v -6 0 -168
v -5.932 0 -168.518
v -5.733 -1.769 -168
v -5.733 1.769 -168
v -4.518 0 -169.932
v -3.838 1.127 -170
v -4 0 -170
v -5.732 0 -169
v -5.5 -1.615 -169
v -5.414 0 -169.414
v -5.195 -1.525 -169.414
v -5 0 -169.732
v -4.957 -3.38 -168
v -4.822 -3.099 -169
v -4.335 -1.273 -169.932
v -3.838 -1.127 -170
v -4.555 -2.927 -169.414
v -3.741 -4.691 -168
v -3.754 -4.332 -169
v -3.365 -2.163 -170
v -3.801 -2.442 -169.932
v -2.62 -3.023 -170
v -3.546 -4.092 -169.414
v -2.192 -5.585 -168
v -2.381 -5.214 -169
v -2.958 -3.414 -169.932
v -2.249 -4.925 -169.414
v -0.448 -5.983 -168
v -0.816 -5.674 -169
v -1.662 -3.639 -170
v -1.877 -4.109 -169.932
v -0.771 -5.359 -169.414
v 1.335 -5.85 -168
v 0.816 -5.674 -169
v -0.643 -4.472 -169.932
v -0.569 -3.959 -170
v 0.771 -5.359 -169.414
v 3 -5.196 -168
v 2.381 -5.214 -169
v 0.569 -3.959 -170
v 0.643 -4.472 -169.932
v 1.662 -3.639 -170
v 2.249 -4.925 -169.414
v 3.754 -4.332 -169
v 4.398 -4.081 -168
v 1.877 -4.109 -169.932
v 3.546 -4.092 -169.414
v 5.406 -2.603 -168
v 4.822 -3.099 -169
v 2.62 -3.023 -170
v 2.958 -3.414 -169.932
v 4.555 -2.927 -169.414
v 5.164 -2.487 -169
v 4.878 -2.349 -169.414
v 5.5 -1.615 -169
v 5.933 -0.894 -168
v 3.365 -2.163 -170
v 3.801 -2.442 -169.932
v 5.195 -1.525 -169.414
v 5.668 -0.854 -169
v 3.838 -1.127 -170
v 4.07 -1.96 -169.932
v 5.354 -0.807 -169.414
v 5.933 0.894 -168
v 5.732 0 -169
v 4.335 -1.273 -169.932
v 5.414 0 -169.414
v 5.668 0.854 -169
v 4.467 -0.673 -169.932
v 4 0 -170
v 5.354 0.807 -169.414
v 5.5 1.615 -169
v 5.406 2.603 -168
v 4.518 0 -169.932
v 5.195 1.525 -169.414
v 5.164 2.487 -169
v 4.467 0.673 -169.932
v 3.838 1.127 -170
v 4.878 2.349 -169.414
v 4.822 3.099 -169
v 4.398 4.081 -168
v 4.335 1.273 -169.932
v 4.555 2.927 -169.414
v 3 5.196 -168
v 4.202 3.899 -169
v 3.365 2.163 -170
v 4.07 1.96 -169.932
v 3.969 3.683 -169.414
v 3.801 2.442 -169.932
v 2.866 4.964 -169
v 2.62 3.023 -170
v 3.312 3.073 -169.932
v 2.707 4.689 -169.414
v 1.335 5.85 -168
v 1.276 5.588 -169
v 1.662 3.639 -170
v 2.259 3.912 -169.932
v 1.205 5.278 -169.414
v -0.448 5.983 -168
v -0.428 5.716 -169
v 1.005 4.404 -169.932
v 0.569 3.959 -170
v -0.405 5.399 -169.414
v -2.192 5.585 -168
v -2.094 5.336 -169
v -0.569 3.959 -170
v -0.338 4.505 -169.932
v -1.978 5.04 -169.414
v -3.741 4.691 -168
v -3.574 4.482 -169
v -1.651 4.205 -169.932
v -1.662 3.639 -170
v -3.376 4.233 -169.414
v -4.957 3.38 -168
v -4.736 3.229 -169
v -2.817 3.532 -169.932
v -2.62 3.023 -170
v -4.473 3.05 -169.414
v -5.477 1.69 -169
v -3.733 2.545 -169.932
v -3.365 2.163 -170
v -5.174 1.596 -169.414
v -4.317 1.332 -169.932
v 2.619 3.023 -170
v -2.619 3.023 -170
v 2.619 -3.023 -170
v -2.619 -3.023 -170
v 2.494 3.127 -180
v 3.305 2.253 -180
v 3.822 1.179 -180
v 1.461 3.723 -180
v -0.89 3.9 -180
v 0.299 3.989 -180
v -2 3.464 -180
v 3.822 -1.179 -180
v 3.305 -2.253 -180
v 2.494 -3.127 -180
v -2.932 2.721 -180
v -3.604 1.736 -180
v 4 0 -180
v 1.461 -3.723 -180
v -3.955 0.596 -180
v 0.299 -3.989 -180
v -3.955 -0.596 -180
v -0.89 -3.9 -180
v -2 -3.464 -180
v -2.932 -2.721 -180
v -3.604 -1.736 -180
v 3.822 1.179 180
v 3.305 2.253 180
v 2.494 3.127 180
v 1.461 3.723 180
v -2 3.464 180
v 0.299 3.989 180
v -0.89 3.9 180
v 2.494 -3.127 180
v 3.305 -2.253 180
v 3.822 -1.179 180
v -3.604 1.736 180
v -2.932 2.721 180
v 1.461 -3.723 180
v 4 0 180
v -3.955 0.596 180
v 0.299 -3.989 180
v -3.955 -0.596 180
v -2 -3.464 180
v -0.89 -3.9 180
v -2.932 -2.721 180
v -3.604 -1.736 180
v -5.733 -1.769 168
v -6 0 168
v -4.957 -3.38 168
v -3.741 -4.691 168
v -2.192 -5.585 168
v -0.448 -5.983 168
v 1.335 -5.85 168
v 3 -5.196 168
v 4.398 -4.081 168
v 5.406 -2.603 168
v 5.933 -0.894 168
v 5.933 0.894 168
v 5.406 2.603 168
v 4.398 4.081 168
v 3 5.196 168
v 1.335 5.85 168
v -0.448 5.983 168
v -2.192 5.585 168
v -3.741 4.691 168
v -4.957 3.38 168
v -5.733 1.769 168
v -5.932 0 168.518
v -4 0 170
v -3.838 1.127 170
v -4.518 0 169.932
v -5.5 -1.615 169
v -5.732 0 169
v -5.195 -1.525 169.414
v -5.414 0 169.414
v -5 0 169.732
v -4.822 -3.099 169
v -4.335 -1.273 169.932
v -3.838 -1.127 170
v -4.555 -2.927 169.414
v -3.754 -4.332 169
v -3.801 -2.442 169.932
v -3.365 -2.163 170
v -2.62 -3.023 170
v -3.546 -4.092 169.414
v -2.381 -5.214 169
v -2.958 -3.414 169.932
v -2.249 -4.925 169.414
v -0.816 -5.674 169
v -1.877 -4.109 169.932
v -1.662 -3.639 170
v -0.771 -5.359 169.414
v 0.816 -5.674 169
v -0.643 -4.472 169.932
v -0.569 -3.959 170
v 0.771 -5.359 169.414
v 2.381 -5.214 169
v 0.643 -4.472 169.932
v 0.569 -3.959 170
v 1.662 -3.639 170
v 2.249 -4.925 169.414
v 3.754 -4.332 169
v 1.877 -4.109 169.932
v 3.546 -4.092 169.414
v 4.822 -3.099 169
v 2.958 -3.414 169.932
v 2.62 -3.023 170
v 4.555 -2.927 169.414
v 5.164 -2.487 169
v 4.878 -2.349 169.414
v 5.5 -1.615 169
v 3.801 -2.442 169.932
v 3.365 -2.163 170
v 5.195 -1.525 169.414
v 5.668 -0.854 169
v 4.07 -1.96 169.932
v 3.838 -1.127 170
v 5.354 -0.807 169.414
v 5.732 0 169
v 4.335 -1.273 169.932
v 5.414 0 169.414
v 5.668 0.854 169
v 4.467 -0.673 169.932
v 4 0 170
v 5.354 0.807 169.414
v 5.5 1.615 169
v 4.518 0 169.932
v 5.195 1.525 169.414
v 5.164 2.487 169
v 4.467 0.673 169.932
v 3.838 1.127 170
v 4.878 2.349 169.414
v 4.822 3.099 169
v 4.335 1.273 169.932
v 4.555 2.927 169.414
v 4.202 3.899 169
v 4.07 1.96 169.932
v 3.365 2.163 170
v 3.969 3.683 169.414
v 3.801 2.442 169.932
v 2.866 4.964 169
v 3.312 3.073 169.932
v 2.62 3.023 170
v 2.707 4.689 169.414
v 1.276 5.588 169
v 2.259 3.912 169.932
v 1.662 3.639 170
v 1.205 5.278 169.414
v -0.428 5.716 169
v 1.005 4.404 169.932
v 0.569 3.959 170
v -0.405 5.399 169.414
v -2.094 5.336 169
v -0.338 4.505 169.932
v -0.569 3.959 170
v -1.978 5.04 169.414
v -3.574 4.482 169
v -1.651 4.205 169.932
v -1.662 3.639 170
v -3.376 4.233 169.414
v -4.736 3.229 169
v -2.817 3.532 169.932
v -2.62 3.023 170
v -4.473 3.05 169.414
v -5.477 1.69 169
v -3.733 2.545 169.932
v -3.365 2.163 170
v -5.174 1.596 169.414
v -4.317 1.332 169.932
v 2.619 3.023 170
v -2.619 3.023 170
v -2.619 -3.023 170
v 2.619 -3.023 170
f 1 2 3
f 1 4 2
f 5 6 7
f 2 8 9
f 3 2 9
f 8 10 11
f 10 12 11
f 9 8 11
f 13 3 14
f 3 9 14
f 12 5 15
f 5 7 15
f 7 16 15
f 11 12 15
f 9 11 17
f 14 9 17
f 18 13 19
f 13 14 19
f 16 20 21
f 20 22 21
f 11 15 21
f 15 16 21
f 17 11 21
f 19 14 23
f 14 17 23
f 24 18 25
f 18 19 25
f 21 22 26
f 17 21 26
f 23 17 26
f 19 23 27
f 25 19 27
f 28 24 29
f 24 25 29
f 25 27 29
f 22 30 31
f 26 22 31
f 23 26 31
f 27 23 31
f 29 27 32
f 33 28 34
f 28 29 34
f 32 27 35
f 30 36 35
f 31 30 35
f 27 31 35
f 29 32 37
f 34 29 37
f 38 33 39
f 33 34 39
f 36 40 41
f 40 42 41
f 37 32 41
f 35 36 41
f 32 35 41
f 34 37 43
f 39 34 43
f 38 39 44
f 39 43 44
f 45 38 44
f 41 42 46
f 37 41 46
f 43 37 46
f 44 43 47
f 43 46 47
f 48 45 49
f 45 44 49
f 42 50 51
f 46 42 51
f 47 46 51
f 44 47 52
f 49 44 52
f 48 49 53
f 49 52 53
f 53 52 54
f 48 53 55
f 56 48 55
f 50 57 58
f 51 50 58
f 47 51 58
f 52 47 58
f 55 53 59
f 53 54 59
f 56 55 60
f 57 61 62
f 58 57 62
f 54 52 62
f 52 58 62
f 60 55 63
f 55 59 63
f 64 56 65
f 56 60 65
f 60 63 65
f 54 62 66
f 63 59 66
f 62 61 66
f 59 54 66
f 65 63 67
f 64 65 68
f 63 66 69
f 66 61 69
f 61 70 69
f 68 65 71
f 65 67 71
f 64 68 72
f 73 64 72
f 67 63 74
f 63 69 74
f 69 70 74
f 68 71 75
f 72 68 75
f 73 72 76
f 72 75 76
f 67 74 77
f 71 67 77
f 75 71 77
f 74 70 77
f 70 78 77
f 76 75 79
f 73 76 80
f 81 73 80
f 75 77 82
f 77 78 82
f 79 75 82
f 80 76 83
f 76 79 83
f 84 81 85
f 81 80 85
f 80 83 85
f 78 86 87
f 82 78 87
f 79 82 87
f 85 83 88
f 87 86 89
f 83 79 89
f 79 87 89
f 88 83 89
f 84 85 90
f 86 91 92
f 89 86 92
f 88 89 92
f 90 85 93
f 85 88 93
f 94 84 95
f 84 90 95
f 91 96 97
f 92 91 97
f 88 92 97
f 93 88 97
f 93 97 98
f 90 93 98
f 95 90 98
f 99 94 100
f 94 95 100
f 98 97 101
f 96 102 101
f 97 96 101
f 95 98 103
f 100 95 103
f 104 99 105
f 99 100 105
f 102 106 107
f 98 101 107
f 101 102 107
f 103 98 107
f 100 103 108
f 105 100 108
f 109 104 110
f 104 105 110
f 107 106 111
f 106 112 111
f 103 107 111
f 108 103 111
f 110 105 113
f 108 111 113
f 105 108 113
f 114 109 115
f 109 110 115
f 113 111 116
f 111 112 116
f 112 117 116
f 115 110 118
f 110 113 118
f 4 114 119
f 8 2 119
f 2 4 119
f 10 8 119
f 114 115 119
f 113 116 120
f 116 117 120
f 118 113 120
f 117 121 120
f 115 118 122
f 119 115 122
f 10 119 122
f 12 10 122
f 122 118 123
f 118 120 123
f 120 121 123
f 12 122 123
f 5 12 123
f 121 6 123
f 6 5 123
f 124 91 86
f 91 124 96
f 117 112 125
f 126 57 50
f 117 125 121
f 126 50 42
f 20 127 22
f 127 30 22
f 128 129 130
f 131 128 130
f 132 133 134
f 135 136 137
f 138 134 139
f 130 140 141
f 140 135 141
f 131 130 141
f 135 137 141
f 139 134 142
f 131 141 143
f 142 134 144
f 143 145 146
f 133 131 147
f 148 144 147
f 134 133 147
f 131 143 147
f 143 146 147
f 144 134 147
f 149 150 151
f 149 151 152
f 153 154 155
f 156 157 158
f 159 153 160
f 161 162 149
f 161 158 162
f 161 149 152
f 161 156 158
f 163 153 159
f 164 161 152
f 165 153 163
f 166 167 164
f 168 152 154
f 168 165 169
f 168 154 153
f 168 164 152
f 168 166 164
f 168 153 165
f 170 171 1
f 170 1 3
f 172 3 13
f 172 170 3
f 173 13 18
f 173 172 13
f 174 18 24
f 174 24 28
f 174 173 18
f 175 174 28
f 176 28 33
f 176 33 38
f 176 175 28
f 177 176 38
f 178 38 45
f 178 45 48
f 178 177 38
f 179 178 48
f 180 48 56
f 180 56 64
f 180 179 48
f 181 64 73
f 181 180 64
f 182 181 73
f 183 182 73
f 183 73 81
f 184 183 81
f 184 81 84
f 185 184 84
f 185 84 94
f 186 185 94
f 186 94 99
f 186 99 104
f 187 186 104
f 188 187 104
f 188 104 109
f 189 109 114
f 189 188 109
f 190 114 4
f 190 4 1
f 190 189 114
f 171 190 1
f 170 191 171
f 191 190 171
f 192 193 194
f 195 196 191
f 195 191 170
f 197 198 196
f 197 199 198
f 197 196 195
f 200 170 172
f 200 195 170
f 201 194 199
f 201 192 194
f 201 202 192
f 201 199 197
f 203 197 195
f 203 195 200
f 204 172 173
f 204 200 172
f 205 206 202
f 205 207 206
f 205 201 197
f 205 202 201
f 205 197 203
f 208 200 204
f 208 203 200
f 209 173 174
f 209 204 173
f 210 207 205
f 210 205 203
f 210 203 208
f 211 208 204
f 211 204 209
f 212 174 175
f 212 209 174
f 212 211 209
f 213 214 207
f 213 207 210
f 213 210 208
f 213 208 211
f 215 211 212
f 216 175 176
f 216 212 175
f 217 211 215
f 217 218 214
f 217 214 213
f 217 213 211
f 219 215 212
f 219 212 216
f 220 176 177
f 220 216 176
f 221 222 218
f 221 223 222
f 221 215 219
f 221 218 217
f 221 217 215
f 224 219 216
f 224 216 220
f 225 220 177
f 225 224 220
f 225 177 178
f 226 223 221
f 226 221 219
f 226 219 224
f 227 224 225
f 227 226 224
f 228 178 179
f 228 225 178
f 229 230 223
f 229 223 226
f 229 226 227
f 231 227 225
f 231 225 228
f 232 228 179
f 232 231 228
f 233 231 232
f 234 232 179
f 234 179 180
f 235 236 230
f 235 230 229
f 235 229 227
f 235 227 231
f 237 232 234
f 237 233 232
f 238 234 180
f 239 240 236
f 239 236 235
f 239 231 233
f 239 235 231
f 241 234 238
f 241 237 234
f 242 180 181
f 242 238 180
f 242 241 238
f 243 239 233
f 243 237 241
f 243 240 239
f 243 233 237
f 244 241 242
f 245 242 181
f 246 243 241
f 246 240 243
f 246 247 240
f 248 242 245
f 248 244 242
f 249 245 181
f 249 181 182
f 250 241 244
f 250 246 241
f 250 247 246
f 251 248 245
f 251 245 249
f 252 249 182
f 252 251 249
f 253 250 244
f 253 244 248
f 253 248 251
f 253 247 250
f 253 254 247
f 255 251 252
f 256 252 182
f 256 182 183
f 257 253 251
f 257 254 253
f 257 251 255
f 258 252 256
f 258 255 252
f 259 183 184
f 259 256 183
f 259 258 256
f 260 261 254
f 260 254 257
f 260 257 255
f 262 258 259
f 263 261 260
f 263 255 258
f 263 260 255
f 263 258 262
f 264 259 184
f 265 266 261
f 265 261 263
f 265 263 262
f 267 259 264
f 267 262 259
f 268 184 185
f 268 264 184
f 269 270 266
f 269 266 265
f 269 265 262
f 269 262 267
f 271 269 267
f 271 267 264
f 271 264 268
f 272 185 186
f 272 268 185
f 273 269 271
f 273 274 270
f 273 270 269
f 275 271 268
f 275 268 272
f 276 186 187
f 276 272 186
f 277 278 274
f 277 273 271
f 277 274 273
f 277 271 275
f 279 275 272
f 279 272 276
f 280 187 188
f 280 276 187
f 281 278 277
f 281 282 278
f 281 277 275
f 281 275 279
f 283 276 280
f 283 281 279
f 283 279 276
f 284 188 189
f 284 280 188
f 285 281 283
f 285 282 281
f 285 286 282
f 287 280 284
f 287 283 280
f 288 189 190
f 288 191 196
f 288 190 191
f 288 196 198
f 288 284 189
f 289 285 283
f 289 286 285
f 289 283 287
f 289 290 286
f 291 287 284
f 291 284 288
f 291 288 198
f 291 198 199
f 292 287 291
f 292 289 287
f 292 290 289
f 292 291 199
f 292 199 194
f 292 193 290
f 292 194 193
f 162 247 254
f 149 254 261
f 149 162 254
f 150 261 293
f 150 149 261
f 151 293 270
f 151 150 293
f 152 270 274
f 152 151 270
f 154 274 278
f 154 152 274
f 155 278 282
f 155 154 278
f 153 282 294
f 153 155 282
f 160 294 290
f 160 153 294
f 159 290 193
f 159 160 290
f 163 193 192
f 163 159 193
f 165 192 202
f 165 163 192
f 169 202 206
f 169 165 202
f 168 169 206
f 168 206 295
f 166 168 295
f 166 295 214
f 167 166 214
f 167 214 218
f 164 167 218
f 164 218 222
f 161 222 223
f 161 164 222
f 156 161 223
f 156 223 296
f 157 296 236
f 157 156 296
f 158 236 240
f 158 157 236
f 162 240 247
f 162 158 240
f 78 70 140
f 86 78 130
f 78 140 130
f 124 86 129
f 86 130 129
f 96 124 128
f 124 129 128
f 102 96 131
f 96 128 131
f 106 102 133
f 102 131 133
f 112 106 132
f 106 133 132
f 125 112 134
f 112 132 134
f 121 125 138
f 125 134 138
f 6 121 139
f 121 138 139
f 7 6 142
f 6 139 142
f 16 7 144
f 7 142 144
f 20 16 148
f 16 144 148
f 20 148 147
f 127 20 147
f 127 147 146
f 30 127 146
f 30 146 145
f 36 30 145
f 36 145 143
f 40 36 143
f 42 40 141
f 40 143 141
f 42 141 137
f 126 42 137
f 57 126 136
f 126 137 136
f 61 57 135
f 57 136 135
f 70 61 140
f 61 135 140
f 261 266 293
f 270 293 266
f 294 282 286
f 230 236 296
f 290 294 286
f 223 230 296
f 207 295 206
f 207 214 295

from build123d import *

# Parameters (mm, degrees)
SKETCH1_R            = 6
BOSS_EXTRUDE1_DEPTH  = 180
SKETCH2_R            = 6
SKETCH2_R_2          = 4
CUT_EXTRUDE1_DEPTH   = 10
FILLET1_R            = 2
FILLET1_OF_MIRROR1_R = 2


with BuildPart() as part:
    # Sketch1 → Boss-Extrude1 (new, symmetric)
    with BuildSketch(Plane.XY):
        with Locations(Location((0, 0, 0), (0, 0, 180))):
            Circle(SKETCH1_R)
    extrude(amount=BOSS_EXTRUDE1_DEPTH, both=True)

    # Sketch2 → Cut-Extrude1 (cut)
    with BuildSketch(Plane.XY.offset(180)):
        with Locations(Location((0, 0, 0), (0, 0, 180))):
            Circle(SKETCH2_R)
        Circle(SKETCH2_R_2, mode=Mode.SUBTRACT)
    cut_extrude1 = extrude(amount=-CUT_EXTRUDE1_DEPTH, mode=Mode.SUBTRACT)

    # Fillet1
    fillet1_edges = [part.edges().sort_by_distance(p)[0] for p in [
        (6, 0, 170),
    ]]
    fillet(fillet1_edges, radius=FILLET1_R - 0.0001)  # a hair under: the kernel refuses the full size

    # Mirror1: Cut-Extrude1 across plane
    add(cut_extrude1.mirror(Plane.XY), mode=Mode.SUBTRACT)

    # Fillet1 of Mirror1
    fillet1_of_mirror1_edges = [part.edges().sort_by_distance(p)[0] for p in [
        (6, 0, -170),
    ]]
    fillet(fillet1_of_mirror1_edges, radius=FILLET1_OF_MIRROR1_R - 0.0001)  # a hair under: the kernel refuses the full size


solid = part.part
